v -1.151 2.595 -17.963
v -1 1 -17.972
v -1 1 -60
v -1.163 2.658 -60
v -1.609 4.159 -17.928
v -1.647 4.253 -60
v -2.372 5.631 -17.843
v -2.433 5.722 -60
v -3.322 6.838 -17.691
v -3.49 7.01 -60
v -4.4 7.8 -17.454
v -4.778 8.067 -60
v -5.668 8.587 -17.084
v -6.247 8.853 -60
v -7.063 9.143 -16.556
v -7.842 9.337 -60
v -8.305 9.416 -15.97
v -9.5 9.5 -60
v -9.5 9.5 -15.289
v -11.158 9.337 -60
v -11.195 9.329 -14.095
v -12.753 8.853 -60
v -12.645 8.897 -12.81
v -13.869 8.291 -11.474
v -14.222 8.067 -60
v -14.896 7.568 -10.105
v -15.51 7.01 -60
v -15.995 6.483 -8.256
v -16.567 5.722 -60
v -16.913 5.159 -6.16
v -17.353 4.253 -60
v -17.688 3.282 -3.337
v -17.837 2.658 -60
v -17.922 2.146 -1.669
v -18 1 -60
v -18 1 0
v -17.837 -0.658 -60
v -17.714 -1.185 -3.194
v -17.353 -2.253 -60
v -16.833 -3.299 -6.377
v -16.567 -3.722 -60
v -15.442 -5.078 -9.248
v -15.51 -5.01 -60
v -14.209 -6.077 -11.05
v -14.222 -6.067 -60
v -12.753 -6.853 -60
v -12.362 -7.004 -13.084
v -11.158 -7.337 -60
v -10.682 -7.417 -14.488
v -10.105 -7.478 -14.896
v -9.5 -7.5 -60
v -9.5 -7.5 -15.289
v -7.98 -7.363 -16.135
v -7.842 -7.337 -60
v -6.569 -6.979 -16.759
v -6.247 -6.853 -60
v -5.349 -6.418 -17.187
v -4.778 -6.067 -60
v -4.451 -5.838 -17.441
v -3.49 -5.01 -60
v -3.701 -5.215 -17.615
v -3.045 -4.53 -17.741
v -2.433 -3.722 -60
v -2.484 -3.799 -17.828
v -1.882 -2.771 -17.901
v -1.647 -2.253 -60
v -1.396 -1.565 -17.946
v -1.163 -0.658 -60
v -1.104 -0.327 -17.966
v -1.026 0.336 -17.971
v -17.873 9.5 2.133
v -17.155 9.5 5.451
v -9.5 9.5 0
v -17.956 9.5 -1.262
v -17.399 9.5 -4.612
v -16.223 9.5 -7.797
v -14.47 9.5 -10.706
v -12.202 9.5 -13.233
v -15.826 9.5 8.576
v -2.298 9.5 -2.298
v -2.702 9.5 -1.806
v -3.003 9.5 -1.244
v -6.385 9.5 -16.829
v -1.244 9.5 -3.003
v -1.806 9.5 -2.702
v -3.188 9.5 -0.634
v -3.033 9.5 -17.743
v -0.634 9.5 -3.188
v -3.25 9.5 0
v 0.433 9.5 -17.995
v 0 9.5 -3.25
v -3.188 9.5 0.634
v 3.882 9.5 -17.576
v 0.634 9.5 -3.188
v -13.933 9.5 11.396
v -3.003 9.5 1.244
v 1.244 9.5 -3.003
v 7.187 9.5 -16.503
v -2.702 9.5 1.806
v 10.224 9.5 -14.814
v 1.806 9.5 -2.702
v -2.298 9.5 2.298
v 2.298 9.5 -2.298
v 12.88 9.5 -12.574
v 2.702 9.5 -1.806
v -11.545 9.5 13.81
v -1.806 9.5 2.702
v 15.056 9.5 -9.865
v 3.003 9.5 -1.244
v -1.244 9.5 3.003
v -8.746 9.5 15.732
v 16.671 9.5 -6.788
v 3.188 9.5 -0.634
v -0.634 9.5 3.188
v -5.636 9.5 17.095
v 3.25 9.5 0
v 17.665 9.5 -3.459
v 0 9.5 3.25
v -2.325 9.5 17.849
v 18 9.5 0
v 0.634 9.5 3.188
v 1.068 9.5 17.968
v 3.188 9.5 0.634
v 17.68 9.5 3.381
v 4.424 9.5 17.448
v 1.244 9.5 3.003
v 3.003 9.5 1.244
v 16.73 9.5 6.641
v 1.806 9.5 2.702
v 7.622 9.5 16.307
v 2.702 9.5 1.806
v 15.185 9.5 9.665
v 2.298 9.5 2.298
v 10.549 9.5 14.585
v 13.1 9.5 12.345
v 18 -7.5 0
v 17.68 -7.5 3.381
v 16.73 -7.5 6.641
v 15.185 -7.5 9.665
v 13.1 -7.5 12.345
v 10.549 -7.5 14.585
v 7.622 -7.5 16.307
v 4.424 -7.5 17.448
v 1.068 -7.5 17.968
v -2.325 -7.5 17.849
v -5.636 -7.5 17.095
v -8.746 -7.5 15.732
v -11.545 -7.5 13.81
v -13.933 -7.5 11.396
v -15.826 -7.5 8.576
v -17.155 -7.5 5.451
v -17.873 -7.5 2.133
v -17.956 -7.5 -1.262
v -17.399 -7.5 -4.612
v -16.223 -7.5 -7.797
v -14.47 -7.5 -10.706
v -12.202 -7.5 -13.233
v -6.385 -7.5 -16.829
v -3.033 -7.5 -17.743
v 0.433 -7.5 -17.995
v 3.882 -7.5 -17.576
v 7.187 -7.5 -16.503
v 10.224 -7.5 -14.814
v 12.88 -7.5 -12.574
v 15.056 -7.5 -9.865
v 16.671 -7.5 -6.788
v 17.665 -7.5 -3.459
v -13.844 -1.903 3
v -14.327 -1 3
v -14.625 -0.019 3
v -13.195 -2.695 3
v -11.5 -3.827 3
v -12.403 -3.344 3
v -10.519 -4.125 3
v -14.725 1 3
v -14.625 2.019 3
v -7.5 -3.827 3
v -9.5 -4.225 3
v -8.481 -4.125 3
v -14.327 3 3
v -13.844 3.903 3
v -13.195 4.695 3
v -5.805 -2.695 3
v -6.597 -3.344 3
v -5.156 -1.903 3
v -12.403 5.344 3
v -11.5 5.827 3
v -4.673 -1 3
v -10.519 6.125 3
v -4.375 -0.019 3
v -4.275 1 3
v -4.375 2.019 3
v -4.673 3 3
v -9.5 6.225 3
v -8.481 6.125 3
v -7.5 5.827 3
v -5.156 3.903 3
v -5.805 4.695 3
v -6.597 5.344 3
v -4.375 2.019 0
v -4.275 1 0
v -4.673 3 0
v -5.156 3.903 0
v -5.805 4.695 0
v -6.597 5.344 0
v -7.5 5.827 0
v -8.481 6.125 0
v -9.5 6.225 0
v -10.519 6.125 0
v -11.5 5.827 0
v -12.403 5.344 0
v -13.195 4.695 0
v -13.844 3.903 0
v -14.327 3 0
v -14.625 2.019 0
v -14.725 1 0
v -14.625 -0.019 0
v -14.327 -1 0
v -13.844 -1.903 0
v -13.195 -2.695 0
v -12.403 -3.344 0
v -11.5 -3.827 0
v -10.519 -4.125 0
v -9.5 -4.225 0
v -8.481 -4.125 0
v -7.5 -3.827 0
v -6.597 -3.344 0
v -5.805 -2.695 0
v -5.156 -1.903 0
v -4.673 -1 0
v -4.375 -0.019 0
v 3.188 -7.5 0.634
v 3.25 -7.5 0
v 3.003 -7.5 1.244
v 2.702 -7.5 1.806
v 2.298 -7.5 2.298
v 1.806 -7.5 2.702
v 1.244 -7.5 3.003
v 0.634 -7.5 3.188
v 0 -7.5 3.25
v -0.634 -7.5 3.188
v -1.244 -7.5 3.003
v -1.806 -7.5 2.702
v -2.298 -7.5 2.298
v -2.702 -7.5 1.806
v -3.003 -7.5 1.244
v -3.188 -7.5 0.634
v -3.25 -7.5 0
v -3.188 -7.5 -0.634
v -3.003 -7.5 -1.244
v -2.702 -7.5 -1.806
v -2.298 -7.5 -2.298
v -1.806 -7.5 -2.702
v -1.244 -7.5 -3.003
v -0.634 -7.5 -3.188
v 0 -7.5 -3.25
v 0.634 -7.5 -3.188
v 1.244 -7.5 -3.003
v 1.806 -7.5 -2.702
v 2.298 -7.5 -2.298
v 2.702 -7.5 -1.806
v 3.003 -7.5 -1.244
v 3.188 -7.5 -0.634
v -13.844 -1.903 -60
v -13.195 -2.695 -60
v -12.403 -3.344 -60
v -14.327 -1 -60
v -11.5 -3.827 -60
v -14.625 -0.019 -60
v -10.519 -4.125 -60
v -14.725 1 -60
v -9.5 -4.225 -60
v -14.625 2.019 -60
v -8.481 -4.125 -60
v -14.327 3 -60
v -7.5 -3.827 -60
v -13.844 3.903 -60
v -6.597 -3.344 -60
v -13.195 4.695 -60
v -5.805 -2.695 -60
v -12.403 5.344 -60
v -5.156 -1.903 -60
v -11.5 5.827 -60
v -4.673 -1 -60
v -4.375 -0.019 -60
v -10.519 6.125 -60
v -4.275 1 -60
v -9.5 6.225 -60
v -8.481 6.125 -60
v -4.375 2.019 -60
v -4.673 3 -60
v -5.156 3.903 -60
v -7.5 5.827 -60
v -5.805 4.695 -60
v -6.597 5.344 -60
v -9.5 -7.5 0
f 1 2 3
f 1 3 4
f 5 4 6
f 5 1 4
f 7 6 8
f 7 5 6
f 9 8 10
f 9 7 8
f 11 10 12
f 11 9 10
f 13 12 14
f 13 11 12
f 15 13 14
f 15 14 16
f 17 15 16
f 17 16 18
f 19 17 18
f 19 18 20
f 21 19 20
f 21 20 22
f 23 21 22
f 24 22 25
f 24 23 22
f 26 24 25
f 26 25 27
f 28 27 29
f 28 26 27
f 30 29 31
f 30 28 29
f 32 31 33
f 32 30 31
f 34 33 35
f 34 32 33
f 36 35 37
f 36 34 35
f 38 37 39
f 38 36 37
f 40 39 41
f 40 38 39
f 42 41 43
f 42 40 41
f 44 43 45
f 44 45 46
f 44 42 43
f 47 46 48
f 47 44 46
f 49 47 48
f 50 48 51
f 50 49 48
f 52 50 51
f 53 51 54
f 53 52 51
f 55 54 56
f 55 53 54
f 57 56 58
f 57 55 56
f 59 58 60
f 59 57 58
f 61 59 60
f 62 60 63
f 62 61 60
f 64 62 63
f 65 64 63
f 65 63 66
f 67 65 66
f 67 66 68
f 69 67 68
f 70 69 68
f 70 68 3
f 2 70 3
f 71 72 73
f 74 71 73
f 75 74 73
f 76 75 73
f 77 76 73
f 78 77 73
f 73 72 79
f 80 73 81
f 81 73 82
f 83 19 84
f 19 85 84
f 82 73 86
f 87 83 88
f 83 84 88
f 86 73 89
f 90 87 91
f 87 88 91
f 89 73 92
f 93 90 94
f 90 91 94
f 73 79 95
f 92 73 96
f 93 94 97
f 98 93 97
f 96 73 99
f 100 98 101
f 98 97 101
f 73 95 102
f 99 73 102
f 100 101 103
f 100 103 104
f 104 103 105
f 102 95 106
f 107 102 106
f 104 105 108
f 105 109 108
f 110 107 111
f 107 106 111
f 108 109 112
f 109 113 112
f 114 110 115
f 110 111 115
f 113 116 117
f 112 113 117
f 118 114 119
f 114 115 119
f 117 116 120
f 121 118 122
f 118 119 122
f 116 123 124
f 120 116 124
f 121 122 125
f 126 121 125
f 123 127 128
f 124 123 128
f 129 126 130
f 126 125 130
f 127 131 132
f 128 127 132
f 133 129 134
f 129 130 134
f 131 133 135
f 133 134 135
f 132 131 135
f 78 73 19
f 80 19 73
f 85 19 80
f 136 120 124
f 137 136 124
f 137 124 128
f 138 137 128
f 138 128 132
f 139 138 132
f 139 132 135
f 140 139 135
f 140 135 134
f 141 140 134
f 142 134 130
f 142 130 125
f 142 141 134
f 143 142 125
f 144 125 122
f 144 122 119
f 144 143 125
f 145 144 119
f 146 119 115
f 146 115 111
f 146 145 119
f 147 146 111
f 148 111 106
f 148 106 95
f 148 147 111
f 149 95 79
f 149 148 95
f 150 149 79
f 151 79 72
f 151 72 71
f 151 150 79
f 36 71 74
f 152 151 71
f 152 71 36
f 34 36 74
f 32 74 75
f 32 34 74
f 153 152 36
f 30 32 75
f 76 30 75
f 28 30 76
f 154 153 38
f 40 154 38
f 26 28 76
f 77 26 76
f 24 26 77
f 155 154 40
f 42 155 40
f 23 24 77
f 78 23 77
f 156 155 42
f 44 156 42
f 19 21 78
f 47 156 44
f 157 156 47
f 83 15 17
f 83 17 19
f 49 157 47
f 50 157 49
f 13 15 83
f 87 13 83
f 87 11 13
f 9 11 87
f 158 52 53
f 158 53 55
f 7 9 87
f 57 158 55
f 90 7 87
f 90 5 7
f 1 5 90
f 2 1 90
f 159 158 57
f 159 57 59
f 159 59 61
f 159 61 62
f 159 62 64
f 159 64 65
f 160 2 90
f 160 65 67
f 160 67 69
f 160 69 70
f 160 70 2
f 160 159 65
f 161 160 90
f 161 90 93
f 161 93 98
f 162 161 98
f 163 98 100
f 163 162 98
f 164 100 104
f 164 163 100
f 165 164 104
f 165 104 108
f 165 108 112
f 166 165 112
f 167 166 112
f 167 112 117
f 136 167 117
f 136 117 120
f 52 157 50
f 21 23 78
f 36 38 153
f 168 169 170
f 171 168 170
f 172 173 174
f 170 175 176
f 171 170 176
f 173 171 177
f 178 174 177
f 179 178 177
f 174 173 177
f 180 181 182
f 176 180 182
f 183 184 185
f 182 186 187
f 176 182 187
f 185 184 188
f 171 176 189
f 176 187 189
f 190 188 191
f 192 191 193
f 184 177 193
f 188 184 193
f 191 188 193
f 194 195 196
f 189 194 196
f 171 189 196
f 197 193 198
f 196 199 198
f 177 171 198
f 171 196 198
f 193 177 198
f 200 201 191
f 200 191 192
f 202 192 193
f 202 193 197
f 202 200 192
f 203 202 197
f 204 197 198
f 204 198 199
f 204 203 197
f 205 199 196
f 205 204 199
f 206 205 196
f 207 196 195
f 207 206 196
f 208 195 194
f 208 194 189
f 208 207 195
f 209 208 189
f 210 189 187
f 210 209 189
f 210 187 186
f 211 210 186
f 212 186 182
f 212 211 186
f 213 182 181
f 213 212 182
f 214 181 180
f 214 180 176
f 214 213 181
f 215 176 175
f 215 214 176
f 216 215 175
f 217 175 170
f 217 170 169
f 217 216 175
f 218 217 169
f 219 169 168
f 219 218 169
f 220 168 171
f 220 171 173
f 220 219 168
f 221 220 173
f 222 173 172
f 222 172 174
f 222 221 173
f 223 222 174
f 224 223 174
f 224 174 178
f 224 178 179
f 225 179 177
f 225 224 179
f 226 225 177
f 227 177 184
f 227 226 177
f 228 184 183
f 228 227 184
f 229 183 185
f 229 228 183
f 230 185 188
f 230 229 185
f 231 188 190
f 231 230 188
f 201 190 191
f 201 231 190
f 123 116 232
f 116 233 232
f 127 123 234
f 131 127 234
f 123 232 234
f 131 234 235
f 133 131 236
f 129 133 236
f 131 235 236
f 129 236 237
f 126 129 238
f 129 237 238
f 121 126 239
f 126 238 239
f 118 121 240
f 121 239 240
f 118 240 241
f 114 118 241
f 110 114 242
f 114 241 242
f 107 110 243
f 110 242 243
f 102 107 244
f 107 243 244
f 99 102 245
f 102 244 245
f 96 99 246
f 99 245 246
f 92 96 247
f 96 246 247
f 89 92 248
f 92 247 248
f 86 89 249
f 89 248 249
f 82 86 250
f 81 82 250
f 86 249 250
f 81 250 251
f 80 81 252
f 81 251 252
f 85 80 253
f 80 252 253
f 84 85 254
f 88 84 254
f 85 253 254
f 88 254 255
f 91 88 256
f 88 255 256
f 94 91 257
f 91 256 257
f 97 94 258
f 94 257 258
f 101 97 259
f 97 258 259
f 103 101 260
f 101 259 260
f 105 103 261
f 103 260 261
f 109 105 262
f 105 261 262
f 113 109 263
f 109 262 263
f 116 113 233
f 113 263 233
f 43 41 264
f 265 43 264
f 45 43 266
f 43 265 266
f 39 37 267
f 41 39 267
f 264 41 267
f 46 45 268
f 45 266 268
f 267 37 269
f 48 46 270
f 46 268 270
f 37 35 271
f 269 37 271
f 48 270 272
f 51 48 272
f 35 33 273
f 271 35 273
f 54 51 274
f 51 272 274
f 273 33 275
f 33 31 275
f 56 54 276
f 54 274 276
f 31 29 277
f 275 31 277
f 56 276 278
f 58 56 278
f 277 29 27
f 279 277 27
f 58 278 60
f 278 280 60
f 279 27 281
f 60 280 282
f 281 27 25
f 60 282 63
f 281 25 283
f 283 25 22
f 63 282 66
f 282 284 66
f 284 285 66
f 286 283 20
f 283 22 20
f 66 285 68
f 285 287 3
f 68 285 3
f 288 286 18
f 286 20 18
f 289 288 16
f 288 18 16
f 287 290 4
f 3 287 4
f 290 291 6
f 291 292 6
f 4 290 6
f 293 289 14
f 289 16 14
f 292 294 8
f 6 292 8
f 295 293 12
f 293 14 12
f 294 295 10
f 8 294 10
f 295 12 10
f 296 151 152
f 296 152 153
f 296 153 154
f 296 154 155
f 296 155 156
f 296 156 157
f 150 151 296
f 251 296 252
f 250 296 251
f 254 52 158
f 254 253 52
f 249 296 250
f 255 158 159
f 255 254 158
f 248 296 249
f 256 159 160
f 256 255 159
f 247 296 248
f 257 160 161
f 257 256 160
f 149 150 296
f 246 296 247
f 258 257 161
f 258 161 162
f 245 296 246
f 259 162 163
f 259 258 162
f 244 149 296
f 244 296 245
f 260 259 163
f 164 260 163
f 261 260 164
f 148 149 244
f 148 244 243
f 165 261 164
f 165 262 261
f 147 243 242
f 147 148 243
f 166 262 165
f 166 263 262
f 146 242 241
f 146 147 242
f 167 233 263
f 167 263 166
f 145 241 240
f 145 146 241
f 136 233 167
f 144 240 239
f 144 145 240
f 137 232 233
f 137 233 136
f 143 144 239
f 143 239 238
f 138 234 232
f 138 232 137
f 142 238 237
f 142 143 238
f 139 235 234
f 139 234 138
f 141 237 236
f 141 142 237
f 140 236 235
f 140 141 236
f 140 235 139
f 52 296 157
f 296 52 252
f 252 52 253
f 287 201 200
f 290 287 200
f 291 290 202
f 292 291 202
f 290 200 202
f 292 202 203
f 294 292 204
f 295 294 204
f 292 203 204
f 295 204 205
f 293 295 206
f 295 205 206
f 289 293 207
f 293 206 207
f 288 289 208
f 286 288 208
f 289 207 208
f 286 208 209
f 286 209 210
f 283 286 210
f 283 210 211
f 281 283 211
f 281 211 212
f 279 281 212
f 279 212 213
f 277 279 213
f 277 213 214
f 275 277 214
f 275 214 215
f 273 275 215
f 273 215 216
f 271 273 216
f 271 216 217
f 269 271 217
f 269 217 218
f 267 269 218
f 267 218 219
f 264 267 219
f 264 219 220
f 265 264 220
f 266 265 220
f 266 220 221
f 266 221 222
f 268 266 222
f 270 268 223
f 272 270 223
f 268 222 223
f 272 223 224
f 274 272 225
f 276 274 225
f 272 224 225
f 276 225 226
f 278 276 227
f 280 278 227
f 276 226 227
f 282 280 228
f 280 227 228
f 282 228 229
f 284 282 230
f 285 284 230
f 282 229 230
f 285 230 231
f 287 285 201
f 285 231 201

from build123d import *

# Parameters (mm, degrees)
F1_R          = 18
F1_R_2        = 3.25
F2_DEPTH      = 7.5
F2_DEPTH_BACK = 9.5
F3_R          = 8.5
F3_R_2        = 5.225
F4_DEPTH      = 60
F5_DEPTH      = 60.0010001
F5_DEPTH_BACK = 3
F6_DEPTH      = 7.5010001009
F6_DEPTH_BACK = 9.5010001
F8_DEPTH      = 50


# Not quite as in the source:
# - a feature of the source that left no trace in its solid (it failed there, or was rolled back) is left out


with BuildPart() as f2:
    # F1 (on Front) → F2 (new body, two sides)
    with BuildSketch(Plane.XZ) as f2_sk:
        Circle(F1_R)
        Circle(F1_R_2, mode=Mode.SUBTRACT)
    extrude(amount=F2_DEPTH)
    extrude(f2_sk.sketch, amount=-F2_DEPTH_BACK)

    # F3 (on Top) → F4 (join)
    with BuildSketch(Plane.XY):
        with Locations((-9.5, 1)):
            Circle(F3_R)
        with Locations((-9.5, 1)):
            Circle(F3_R_2, mode=Mode.SUBTRACT)
        with Locations((-9.5, 1)):
            Circle(F3_R_2)
    extrude(amount=-F4_DEPTH)

    # F3 (on Top) → F5 (cut, two sides)
    with BuildSketch(Plane.XY) as f5_sk:
        with Locations((-9.5, 1)):
            Circle(F3_R_2)
    extrude(amount=-F5_DEPTH, mode=Mode.SUBTRACT)
    extrude(f5_sk.sketch, amount=F5_DEPTH_BACK, mode=Mode.SUBTRACT)

    # F1 (on Front) → F6 (cut, two sides)
    with BuildSketch(Plane.XZ) as f6_sk:
        Circle(F1_R_2)
    extrude(amount=F6_DEPTH, mode=Mode.SUBTRACT)
    extrude(f6_sk.sketch, amount=-F6_DEPTH_BACK, mode=Mode.SUBTRACT)

    # F1 (on Front) → F8 (cut, symmetric)
    with BuildSketch(Plane.XZ):
        Circle(F1_R_2)
    extrude(amount=F8_DEPTH, both=True, mode=Mode.SUBTRACT)


solid = f2.part
